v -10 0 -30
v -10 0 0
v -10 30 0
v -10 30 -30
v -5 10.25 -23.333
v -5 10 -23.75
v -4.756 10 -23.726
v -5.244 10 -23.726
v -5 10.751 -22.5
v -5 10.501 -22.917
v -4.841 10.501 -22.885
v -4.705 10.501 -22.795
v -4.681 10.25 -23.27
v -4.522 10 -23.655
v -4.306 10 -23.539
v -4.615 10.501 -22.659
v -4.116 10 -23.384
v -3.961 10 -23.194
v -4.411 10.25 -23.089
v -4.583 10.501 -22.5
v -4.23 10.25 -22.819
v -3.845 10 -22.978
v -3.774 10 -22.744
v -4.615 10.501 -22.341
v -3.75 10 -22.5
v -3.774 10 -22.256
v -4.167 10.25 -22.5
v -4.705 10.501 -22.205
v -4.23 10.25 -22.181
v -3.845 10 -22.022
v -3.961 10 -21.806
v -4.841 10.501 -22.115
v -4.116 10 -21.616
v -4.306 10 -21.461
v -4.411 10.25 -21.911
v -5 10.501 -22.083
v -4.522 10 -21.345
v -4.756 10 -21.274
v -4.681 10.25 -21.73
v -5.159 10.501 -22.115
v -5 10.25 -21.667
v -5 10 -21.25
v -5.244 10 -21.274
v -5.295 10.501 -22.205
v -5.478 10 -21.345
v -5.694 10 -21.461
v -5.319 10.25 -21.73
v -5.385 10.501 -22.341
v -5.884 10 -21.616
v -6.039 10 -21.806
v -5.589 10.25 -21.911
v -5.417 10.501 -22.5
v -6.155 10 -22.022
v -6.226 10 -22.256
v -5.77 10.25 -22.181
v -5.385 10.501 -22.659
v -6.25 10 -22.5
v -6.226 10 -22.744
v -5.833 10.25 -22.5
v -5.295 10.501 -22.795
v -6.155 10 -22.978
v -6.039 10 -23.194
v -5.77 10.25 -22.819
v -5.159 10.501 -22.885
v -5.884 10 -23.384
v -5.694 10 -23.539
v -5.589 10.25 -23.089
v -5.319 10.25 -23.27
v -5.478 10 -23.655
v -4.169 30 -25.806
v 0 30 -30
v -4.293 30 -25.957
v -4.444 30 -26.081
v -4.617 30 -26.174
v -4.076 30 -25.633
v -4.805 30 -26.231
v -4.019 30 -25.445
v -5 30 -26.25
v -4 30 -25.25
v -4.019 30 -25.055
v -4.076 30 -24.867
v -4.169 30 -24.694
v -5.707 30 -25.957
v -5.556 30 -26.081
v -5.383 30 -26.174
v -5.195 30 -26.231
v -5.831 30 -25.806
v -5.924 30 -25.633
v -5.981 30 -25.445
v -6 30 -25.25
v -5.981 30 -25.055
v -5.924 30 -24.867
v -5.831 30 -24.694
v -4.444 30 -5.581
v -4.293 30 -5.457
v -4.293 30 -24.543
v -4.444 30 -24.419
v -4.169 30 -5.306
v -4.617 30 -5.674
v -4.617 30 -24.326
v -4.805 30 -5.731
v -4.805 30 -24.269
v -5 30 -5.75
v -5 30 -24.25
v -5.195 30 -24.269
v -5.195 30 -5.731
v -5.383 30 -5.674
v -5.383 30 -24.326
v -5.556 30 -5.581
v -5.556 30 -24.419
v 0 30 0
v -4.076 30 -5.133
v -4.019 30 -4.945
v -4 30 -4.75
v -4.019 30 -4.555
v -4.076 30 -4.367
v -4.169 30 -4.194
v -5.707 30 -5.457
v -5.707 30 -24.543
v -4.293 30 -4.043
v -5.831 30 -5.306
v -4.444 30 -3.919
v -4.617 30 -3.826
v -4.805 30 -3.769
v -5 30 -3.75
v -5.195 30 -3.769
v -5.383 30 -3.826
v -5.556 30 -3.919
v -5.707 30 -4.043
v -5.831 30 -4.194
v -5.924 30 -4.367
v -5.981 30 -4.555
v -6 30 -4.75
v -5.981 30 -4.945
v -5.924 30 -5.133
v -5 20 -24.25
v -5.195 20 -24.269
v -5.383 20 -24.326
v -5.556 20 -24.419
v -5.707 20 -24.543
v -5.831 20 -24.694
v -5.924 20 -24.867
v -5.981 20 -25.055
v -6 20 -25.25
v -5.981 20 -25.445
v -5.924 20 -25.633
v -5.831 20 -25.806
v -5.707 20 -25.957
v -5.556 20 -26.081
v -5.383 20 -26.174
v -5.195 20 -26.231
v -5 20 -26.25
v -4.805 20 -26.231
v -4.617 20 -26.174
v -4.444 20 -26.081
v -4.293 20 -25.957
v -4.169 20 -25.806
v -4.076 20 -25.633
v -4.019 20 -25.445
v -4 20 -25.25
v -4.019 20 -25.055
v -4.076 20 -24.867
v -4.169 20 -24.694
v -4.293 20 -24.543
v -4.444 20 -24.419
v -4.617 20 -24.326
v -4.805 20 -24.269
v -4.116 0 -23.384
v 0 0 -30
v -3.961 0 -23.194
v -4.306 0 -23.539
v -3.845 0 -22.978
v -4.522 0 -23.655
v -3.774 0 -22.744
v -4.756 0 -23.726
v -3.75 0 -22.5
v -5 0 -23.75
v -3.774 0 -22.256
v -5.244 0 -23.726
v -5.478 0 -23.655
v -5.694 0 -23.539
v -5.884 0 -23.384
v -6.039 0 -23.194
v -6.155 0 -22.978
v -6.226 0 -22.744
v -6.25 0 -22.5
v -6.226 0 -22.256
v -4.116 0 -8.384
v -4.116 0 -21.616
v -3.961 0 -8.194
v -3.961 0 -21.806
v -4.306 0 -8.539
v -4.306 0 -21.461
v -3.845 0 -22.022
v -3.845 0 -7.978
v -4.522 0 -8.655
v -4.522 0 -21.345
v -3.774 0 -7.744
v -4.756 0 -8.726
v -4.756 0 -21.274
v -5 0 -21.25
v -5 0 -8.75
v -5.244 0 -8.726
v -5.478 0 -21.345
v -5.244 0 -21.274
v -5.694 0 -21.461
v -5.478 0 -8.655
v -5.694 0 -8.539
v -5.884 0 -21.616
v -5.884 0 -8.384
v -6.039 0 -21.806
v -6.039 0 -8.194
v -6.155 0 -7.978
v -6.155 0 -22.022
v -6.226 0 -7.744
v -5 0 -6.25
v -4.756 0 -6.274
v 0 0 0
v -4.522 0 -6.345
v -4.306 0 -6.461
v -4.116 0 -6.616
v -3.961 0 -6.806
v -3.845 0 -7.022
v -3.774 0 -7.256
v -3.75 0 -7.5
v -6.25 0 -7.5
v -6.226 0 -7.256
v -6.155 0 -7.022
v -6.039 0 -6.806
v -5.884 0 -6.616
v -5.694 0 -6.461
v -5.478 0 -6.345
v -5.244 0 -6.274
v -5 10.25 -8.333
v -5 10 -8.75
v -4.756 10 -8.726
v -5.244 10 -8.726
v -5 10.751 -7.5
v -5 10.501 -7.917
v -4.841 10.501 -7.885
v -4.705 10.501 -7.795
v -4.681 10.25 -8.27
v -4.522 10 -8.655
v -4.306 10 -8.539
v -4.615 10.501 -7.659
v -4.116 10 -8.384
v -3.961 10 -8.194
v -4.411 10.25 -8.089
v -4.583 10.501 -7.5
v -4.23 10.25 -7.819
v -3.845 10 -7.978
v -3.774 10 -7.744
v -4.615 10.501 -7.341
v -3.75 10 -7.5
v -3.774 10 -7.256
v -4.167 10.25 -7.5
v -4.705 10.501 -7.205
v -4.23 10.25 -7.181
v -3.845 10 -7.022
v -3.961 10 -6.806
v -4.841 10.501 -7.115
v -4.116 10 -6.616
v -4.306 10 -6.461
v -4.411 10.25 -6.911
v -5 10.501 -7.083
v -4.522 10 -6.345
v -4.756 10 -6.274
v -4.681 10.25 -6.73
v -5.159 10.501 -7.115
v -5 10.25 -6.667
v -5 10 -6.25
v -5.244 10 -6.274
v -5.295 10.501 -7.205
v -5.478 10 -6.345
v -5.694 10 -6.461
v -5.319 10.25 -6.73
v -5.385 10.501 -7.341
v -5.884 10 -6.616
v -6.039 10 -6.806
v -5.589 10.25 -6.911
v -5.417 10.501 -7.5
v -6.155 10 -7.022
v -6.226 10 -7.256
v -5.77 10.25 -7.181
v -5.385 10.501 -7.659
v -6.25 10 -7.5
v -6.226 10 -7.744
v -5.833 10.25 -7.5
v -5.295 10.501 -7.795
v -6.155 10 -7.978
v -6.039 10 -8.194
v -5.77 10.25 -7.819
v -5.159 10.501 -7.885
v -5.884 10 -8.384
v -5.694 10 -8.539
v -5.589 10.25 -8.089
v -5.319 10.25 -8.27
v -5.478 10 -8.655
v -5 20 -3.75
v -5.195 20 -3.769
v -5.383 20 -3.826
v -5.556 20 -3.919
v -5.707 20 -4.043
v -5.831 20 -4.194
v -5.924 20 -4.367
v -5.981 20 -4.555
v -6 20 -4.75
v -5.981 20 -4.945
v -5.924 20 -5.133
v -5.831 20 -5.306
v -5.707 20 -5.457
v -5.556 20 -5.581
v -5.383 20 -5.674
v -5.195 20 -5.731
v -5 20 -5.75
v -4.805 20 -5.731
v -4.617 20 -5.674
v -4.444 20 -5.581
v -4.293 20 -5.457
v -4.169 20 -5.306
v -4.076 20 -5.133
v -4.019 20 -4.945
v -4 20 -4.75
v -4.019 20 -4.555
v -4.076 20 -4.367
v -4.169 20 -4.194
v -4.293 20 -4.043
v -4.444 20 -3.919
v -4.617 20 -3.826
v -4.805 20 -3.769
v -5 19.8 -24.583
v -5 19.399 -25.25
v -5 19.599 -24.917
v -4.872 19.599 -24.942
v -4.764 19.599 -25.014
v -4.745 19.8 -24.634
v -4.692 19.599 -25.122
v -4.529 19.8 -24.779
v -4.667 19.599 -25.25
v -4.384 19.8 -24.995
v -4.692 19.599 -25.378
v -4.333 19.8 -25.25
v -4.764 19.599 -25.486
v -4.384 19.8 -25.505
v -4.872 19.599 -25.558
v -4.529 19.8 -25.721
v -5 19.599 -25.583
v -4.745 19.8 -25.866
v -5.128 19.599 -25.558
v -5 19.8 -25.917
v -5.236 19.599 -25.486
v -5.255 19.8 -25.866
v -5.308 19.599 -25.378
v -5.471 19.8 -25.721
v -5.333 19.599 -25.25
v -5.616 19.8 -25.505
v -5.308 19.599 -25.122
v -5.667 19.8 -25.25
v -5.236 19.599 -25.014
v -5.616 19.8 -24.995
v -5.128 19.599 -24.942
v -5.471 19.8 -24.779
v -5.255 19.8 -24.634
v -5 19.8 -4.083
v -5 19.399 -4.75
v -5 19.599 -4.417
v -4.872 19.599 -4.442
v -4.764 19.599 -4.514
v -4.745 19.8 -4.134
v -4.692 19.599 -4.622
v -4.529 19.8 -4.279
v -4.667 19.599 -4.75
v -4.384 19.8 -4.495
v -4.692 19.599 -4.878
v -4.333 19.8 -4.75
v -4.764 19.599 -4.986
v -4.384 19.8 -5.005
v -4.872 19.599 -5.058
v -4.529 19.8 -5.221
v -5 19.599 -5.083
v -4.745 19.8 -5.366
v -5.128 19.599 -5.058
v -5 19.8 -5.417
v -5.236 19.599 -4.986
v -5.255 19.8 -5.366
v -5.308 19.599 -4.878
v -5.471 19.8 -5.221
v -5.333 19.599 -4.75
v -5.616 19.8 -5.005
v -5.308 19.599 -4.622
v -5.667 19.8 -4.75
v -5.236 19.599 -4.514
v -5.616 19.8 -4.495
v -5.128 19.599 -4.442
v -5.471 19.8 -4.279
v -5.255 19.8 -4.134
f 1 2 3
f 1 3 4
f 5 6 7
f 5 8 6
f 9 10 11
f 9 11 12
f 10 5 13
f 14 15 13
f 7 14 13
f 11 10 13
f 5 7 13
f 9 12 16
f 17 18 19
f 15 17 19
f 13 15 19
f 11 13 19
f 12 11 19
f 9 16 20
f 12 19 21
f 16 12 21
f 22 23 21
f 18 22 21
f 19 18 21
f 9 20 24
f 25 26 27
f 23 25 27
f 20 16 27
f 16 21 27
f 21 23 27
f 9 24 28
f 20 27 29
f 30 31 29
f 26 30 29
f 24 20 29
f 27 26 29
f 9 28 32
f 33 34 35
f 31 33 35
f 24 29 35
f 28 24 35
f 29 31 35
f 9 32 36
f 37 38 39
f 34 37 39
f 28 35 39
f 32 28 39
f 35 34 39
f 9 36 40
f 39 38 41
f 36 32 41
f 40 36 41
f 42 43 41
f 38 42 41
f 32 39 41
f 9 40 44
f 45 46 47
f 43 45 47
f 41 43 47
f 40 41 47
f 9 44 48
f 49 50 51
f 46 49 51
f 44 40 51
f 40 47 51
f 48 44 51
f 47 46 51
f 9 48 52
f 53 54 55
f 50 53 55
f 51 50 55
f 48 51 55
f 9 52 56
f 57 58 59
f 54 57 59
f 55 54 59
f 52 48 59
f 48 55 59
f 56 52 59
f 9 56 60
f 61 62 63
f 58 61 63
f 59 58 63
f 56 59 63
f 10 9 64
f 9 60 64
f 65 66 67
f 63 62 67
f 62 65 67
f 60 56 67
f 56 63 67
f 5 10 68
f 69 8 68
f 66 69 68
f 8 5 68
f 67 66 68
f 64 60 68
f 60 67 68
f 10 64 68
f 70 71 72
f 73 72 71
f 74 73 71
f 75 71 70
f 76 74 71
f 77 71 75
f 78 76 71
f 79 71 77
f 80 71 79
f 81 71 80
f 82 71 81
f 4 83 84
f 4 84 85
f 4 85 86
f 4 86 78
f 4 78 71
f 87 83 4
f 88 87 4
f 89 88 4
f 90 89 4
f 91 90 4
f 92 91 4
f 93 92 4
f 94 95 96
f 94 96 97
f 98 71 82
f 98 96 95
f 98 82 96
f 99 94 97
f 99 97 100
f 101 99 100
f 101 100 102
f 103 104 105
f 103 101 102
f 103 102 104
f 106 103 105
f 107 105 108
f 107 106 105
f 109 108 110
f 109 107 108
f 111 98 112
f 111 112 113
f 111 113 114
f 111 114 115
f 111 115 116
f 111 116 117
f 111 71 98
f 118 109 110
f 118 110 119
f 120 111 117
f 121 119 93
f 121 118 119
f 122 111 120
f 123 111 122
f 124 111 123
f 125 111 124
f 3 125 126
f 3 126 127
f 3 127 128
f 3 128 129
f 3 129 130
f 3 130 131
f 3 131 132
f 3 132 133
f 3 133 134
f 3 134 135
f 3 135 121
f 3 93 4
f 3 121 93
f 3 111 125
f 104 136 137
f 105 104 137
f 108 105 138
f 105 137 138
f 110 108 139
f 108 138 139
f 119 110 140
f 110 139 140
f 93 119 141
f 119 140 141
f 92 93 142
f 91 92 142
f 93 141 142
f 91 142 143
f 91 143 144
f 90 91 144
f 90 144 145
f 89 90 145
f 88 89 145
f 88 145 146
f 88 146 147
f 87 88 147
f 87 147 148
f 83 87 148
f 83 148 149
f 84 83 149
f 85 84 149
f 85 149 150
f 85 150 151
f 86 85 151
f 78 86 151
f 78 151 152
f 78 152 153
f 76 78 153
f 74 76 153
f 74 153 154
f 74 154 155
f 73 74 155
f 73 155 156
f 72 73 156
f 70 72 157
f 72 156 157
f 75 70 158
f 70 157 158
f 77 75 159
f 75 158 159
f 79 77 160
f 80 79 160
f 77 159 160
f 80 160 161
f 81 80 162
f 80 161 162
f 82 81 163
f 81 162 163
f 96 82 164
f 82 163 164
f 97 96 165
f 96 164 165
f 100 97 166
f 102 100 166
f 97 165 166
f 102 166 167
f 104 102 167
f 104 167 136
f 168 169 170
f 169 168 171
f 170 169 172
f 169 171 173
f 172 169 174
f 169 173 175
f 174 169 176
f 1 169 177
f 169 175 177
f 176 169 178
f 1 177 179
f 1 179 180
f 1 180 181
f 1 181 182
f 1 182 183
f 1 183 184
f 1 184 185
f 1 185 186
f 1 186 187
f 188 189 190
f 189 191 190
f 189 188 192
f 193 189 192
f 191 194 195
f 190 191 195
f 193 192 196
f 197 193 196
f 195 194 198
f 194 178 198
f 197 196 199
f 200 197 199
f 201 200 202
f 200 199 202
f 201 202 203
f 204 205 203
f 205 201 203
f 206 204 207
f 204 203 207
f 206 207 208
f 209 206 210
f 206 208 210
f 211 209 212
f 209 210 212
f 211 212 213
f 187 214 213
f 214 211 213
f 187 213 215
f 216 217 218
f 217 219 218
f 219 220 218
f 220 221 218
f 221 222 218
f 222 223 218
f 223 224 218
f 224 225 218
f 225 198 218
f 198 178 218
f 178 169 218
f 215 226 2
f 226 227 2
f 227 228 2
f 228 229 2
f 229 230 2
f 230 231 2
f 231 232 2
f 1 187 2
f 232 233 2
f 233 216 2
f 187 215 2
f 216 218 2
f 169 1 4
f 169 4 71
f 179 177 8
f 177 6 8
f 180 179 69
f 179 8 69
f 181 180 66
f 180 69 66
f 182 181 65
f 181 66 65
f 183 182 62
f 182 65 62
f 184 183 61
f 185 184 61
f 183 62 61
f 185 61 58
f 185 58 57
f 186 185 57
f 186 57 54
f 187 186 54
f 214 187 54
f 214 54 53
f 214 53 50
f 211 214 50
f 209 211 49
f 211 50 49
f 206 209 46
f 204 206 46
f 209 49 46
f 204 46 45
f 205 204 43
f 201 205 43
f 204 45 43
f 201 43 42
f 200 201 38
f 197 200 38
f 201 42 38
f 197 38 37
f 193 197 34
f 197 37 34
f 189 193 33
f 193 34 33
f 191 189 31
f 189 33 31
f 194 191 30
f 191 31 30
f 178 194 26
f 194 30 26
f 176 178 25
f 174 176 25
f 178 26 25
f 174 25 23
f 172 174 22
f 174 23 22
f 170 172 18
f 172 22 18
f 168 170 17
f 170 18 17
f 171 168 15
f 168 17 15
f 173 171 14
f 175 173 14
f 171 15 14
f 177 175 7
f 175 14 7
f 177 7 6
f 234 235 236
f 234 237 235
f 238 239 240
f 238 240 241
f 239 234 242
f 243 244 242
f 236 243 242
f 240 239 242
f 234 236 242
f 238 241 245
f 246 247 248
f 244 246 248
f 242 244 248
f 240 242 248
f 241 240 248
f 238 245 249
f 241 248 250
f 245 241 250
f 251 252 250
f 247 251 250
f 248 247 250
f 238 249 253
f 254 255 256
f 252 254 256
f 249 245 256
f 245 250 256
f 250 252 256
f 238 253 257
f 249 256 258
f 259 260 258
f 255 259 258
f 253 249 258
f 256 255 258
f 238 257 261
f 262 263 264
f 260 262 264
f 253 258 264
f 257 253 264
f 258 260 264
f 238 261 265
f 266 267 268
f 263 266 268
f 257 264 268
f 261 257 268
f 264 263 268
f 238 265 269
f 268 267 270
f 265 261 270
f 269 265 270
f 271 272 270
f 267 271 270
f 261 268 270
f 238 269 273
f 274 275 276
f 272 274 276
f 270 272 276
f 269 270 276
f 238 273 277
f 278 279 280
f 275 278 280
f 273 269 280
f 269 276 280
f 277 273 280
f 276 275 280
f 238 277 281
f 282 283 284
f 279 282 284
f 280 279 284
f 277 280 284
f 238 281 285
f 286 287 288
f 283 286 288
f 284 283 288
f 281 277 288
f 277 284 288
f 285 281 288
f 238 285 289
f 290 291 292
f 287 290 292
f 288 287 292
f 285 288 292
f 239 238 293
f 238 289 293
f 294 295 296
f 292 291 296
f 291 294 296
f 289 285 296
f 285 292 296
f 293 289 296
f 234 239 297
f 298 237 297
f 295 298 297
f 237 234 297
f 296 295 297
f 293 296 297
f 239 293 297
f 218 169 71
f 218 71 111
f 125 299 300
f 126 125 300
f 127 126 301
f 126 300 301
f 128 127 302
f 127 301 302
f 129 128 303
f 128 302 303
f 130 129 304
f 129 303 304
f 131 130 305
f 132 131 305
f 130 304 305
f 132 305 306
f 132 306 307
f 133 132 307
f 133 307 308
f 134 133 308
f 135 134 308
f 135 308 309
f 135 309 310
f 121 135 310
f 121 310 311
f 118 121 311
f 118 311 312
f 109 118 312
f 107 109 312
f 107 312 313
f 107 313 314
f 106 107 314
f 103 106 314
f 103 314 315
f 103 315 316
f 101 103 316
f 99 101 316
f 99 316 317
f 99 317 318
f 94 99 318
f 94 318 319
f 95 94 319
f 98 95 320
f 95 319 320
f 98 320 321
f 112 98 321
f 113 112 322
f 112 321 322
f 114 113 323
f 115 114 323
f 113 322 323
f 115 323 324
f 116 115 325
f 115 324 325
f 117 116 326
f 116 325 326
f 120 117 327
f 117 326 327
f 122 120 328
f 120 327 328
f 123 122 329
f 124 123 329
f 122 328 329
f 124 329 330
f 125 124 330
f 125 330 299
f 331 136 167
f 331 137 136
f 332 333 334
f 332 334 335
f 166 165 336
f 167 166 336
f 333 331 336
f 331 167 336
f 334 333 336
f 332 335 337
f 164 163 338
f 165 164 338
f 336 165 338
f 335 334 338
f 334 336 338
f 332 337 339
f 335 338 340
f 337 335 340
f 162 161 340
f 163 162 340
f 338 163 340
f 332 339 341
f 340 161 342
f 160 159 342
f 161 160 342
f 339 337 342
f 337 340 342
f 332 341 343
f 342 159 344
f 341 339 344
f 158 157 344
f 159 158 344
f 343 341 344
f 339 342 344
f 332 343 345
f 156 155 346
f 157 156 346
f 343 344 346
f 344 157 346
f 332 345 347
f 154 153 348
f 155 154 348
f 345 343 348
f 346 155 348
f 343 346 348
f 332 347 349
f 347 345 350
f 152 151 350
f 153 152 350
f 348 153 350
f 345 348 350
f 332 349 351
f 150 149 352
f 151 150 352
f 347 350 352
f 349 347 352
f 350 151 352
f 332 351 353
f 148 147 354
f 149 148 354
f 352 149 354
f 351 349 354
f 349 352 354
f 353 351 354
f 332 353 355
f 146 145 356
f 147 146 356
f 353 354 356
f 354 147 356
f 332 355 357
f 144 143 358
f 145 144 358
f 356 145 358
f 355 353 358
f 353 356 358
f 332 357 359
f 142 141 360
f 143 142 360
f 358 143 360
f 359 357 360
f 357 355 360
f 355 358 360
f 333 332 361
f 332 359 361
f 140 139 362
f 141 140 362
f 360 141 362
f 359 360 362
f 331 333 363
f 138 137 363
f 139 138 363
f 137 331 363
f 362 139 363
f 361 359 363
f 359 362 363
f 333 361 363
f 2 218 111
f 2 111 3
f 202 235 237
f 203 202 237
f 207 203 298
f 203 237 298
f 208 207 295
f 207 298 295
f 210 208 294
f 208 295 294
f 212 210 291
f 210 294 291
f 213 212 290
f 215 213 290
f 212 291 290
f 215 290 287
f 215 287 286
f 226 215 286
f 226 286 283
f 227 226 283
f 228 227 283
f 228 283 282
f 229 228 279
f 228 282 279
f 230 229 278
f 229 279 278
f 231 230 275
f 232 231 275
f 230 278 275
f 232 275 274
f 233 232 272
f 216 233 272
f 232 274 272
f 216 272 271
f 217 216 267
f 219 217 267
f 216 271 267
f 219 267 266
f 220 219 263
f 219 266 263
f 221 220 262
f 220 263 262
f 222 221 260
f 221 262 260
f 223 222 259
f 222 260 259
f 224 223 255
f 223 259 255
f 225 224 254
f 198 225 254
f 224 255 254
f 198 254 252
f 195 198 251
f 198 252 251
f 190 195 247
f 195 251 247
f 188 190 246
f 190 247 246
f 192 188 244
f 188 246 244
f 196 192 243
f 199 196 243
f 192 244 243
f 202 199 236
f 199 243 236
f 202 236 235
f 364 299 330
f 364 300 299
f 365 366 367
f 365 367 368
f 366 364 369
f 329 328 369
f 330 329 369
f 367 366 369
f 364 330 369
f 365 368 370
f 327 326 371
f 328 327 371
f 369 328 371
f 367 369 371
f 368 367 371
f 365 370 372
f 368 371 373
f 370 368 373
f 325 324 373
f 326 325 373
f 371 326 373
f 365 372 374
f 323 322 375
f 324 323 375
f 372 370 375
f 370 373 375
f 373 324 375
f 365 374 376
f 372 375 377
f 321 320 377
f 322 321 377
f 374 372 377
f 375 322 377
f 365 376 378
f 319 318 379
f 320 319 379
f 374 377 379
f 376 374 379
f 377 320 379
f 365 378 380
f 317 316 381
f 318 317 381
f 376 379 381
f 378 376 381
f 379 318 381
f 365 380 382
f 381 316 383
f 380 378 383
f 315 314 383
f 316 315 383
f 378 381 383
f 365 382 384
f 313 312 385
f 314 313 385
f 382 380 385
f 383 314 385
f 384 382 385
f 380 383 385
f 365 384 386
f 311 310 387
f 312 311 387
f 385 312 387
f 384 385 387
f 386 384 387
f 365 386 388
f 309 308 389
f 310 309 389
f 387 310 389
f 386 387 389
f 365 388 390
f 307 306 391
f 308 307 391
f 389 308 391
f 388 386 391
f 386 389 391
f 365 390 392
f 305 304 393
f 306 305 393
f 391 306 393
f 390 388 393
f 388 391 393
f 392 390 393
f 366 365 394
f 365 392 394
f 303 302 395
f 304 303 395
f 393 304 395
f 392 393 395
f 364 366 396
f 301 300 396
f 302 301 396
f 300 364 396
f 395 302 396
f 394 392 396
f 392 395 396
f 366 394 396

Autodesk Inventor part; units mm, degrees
ref_plane "YZ Plane" through (0, 0, 0) normal (1, 0, 0) x (0, 1, 0)
ref_plane "XZ Plane" through (0, 0, 0) normal (0, 1, 0) x (-1, 0, 0)
ref_plane "XY Plane" through (0, 0, 0) normal (0, 0, 1) x (1, 0, 0)
sketch "Skizze1" plane through (0, 0, 0) normal (0, 1, 0) x (-1, 0, 0)
  line L0 (0, 0) -> (10, 0)
  line L1 (10, 0) -> (10, -30)
  line L2 (10, -30) -> (0, -30)
  line L3 (0, -30) -> (0, 0)
  dimension "d0" = 10
  dimension "d1" = 30
extrude "Extrusion1" add sketch "Skizze1" along normal blind 30
sketch "Skizze2" plane through (0, 30, 0) normal (0, 1, 0) x (1, 0, 0)
  line L0 (-10, 0) -> (0, 0) projected
  line L1 (0, 0) -> (0, 30) projected
  point P0 (-5, 4.75)
  point P1 (-5, 25.25)
  dimension "d4" = 20.5
  dimension "d5" = 4.75
  dimension "d6" = 5
hole "Bohrung1" at (-5, 30, -4.75) at (-5, 30, -25.25) direction (0, -1, 0) diameter 2 depth 10 tip angle 118
sketch "Skizze4" plane through (0, 0, 0) normal (0, -1, 0) x (1, 0, 0)
  line L0 (0, 0) -> (-10, 0) projected
  line L1 (0, -30) -> (0, 0) projected
  point P0 (-5, -22.5)
  point P1 (-5, -7.5)
  dimension "d21" = 15
  dimension "d22" = 7.5
  dimension "d23" = 5
hole "Bohrung3" at (-5, 0, -22.5) at (-5, 0, -7.5) direction (0, 1, 0) diameter 2.5 depth 10 tip angle 118
properties part number "KugelRadStützen"
